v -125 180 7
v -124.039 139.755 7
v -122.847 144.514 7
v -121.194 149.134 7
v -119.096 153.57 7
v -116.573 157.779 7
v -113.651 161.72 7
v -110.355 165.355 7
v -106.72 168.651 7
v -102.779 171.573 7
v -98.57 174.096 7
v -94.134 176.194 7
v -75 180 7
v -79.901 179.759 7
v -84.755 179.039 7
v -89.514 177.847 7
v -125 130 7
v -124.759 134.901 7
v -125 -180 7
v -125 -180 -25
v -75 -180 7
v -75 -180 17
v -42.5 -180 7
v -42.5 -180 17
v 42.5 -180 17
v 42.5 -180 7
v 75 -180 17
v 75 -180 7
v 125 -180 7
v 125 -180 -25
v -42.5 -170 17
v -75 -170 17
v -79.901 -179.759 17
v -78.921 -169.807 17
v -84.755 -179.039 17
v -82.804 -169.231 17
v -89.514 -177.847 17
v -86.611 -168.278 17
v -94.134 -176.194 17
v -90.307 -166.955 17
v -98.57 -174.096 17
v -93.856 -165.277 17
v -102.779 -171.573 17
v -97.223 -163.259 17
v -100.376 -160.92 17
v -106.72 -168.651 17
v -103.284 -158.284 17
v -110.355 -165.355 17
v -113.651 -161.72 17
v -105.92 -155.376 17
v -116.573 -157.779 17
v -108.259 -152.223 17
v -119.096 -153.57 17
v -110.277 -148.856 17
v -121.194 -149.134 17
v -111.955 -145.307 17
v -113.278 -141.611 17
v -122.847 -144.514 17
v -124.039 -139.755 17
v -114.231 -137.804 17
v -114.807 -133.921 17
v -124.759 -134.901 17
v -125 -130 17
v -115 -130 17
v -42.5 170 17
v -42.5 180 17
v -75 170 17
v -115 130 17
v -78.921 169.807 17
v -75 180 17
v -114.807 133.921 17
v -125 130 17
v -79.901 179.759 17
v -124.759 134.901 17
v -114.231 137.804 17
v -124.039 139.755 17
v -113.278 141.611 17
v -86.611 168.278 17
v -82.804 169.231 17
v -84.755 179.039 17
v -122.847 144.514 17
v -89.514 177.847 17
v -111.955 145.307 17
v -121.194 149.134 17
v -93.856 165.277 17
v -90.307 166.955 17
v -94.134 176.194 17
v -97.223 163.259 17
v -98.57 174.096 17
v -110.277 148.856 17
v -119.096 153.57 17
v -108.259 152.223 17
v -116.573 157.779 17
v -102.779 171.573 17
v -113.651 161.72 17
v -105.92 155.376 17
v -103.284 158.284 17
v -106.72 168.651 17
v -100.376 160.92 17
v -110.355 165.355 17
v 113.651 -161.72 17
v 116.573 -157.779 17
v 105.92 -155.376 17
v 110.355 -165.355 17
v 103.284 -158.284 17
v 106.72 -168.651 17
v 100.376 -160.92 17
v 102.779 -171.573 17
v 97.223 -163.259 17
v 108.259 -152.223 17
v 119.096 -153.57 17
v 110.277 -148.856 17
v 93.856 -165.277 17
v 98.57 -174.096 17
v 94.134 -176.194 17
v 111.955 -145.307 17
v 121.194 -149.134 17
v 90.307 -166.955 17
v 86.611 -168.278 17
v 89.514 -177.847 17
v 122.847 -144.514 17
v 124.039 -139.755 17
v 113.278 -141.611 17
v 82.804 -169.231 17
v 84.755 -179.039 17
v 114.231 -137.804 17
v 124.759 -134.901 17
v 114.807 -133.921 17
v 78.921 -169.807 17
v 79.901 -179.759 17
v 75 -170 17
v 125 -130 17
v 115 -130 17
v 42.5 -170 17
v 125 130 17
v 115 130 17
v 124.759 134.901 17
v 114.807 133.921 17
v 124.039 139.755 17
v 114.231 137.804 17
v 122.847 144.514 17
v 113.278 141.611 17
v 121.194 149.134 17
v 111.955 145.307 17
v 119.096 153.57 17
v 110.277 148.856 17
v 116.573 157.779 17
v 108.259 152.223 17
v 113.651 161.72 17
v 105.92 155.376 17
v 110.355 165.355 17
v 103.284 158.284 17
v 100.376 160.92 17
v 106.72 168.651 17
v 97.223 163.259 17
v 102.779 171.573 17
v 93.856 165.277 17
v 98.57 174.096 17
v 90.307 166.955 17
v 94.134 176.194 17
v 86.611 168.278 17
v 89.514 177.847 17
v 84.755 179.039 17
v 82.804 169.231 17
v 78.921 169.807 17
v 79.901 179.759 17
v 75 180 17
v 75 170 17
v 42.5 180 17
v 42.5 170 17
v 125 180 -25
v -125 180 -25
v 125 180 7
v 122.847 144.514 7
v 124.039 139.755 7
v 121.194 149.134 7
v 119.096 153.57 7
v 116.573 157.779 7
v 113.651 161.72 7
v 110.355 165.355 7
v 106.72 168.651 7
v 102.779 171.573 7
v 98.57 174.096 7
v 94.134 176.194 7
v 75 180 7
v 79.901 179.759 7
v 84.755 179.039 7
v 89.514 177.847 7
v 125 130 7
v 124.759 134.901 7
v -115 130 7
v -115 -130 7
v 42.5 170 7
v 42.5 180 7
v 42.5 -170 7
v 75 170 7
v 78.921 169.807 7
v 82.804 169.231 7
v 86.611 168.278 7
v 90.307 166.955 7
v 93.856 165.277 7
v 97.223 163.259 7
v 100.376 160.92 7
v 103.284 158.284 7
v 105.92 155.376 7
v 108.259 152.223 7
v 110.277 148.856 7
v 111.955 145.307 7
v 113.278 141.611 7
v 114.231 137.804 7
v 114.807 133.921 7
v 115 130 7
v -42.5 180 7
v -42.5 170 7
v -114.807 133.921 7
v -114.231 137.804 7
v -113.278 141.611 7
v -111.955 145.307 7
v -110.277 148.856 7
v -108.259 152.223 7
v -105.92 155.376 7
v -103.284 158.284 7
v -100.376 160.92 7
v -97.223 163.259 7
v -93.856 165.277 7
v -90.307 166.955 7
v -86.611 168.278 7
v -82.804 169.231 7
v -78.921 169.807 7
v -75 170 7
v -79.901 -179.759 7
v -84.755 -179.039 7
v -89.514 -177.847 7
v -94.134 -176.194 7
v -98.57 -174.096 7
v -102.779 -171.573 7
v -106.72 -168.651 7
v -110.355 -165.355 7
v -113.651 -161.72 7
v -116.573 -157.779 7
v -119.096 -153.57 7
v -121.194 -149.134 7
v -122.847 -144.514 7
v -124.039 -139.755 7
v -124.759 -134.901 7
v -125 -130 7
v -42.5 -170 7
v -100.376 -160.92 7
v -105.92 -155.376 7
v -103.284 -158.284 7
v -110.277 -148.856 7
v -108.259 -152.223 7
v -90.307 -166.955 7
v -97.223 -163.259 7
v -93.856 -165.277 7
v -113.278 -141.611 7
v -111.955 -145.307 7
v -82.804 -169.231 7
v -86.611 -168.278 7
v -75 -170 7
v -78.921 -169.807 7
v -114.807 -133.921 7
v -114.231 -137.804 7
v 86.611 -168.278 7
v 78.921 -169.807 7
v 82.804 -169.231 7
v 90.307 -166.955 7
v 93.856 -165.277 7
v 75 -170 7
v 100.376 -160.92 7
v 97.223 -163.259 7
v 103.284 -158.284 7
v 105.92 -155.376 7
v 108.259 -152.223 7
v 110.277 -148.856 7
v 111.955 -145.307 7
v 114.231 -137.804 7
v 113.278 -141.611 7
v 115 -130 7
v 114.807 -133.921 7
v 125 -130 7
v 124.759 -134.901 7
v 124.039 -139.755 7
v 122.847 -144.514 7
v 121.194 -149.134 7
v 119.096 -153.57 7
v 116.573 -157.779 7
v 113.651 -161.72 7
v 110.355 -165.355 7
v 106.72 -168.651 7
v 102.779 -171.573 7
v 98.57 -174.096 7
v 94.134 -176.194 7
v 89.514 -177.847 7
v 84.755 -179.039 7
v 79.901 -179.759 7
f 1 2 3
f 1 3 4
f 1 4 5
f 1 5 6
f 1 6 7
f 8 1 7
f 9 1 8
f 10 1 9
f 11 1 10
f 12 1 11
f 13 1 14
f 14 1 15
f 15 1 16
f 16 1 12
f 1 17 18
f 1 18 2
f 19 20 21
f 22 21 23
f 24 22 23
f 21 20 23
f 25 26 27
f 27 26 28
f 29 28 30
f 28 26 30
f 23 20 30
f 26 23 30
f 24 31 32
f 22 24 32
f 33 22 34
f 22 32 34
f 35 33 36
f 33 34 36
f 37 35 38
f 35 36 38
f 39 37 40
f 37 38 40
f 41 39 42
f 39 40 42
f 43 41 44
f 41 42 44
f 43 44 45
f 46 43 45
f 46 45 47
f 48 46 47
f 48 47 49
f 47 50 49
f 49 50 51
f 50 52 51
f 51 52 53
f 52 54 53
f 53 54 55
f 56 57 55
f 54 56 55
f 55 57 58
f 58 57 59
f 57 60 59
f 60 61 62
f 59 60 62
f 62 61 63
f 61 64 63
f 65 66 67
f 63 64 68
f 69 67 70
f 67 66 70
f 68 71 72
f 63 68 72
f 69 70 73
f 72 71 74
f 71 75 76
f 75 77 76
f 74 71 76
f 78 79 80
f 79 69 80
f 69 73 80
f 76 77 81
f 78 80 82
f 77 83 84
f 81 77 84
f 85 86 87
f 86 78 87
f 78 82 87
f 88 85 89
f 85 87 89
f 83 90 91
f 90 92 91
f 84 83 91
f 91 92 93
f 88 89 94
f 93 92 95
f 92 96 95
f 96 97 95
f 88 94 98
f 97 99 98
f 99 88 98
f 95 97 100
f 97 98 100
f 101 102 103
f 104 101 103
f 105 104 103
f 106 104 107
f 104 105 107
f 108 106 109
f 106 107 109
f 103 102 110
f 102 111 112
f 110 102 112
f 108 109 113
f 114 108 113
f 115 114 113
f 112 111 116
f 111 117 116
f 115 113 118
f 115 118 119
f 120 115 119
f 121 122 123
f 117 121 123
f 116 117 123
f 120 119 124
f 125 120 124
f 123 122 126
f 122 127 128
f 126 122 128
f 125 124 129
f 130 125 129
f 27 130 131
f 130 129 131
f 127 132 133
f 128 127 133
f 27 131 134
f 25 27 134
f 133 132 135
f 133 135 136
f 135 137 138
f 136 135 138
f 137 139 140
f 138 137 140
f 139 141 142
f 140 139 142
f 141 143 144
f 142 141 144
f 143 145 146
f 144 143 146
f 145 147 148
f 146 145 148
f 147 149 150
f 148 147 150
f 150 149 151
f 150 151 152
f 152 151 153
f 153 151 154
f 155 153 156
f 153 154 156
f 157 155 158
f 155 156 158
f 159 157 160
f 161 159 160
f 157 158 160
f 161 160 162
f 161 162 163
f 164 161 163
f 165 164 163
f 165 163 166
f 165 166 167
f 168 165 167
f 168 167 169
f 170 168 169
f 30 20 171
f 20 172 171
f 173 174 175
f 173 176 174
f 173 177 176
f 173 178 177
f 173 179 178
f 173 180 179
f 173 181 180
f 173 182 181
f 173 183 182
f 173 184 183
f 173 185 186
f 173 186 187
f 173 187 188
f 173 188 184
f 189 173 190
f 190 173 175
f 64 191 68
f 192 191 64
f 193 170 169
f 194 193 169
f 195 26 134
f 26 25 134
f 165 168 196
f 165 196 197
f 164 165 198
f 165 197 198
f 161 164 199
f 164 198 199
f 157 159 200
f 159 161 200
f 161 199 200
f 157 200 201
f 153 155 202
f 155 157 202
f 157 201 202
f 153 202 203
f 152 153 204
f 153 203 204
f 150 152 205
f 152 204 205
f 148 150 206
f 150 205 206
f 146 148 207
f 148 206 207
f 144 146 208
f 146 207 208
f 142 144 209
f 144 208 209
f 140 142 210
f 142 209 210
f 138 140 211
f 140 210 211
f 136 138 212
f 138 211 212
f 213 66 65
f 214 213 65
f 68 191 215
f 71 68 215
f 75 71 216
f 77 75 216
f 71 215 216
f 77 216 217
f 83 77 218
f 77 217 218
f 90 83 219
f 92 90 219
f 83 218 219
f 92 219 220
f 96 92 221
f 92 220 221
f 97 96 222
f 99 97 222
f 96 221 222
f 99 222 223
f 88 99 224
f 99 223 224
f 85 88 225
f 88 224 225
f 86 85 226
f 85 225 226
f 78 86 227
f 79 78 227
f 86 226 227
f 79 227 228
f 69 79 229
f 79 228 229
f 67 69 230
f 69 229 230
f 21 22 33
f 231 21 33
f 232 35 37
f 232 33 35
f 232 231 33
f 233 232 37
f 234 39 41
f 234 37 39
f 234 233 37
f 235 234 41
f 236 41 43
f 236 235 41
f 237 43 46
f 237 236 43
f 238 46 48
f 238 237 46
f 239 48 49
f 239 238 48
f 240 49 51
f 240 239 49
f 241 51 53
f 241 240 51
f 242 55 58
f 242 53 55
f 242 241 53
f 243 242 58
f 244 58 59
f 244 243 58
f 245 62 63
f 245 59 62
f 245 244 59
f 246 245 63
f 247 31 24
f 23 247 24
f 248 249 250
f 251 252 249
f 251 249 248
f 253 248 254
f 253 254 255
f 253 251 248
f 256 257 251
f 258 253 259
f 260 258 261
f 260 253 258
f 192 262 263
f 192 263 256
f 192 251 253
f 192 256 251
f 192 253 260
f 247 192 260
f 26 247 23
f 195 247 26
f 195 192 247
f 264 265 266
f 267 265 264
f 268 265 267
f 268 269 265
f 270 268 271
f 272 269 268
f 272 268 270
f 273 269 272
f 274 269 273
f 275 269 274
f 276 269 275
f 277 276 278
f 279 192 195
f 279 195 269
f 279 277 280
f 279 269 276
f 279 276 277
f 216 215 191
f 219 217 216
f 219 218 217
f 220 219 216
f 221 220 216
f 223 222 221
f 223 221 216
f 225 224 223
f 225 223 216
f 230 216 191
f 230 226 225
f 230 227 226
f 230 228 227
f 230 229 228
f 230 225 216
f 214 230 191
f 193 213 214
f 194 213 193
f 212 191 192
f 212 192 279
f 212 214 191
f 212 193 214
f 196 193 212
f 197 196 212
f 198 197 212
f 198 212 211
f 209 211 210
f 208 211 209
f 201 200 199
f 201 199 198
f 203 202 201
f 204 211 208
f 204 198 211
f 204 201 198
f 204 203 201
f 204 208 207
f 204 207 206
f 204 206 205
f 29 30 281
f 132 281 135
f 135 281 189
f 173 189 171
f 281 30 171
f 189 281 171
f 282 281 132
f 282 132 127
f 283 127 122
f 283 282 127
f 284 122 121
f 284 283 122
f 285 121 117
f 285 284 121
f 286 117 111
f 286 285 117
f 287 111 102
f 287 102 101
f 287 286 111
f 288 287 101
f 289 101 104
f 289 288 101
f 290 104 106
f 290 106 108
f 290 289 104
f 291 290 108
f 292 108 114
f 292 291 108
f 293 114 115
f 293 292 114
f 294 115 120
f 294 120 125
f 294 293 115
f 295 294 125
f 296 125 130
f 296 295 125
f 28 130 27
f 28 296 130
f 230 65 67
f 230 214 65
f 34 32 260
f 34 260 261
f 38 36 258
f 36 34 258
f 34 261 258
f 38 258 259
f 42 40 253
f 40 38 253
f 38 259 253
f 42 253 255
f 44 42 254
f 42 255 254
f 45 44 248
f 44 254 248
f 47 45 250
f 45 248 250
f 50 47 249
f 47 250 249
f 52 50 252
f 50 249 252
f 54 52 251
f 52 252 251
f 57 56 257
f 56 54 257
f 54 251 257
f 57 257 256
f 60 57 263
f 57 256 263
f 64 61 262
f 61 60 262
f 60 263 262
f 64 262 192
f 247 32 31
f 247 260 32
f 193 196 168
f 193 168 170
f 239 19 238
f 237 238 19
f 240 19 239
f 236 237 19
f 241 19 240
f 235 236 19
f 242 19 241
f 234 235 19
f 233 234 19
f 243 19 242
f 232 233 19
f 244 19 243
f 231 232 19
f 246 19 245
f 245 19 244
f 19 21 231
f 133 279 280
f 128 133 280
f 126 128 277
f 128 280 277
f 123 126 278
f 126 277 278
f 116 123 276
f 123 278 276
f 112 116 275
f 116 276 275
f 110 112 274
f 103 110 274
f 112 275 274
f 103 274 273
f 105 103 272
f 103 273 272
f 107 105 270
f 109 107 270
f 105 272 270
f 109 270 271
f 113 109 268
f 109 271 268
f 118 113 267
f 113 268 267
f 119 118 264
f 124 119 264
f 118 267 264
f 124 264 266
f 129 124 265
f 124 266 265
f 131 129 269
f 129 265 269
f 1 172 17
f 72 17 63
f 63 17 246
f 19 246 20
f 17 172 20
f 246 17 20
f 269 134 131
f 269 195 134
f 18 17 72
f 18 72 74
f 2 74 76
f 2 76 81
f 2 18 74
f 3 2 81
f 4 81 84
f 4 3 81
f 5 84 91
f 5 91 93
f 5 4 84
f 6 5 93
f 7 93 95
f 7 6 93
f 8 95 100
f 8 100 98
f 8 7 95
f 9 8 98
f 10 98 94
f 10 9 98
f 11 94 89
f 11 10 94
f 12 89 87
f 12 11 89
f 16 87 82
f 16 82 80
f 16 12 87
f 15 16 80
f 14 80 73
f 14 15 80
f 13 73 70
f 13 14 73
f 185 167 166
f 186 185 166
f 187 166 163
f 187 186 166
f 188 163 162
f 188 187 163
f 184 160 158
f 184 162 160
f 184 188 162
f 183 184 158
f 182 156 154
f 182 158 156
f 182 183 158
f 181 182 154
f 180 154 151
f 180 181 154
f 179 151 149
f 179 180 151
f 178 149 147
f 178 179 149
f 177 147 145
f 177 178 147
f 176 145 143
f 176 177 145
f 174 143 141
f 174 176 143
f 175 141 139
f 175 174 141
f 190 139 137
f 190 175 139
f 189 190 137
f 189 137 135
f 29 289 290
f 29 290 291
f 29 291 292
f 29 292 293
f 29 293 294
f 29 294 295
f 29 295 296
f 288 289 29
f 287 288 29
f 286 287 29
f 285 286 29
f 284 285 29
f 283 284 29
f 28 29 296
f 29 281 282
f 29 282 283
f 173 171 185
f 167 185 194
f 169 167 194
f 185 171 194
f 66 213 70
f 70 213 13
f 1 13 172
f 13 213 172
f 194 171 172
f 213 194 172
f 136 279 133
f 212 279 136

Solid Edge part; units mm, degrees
sketch "Sketch1" plane through (0, 0, 0) normal (0, 0, 1) x (1, 0, 0)
  line L0 (-125, -180) -> (125, -180)
  line L1 (125, -180) -> (125, 180)
  line L2 (125, 180) -> (-125, 180)
  line L3 (-125, 180) -> (-125, -180)
extrude "Protrusion1" add sketch "Sketch1" along normal blind 7
sketch "Sketch2" plane through (0, 0, 7) normal (0, 0, 1) x (1, 0, 0)
  line L0 (75, -180) -> (-75, -180)
  arc A0 (-125, -130) -> (-75, -180) centre (-75, -130) ccw
  line L1 (-125, -130) -> (-125, 130)
  arc A1 (-125, 130) -> (-75, 180) centre (-75, 130) cw
  line L2 (-75, 180) -> (75, 180)
  arc A2 (125, 130) -> (75, 180) centre (75, 130) ccw
  line L3 (125, 130) -> (125, -130)
  arc A3 (125, -130) -> (75, -180) centre (75, -130) cw
  line L4 (75, 170) -> (-75, 170)
  arc A4 (-115, 130) -> (-75, 170) centre (-75, 130) cw
  line L5 (-115, 130) -> (-115, -130)
  arc A5 (-115, -130) -> (-75, -170) centre (-75, -130) ccw
  line L6 (-75, -170) -> (75, -170)
  arc A6 (115, -130) -> (75, -170) centre (75, -130) cw
  line L7 (115, -130) -> (115, 130)
  arc A7 (115, 130) -> (75, 170) centre (75, 130) ccw
extrude "ExtrudedProtrusion_3" add sketch "Sketch2" along normal blind 10
sketch "Sketch3" plane through (0, 0, 17) normal (0, 0, 1) x (1, 0, 0)
  line L0 (-42.5, -180) -> (42.5, -180)
  line L1 (42.5, -180) -> (42.5, 180)
  line L2 (42.5, 180) -> (-42.5, 180)
  line L3 (-42.5, 180) -> (-42.5, -180)
extrude "ExtrudedCutout_1" cut sketch "Sketch3" against normal blind 10
sketch "Sketch4" plane through (0, 0, 0) normal (0, 0, -1) x (1, 0, 0)
  line L0 (125, -180) -> (-125, -180)
  line L1 (-125, -180) -> (-125, 180)
  line L2 (-125, 180) -> (125, 180)
  line L3 (125, 180) -> (125, -180)
extrude "ExtrudedProtrusion_4" add sketch "Sketch4" along normal blind 25
